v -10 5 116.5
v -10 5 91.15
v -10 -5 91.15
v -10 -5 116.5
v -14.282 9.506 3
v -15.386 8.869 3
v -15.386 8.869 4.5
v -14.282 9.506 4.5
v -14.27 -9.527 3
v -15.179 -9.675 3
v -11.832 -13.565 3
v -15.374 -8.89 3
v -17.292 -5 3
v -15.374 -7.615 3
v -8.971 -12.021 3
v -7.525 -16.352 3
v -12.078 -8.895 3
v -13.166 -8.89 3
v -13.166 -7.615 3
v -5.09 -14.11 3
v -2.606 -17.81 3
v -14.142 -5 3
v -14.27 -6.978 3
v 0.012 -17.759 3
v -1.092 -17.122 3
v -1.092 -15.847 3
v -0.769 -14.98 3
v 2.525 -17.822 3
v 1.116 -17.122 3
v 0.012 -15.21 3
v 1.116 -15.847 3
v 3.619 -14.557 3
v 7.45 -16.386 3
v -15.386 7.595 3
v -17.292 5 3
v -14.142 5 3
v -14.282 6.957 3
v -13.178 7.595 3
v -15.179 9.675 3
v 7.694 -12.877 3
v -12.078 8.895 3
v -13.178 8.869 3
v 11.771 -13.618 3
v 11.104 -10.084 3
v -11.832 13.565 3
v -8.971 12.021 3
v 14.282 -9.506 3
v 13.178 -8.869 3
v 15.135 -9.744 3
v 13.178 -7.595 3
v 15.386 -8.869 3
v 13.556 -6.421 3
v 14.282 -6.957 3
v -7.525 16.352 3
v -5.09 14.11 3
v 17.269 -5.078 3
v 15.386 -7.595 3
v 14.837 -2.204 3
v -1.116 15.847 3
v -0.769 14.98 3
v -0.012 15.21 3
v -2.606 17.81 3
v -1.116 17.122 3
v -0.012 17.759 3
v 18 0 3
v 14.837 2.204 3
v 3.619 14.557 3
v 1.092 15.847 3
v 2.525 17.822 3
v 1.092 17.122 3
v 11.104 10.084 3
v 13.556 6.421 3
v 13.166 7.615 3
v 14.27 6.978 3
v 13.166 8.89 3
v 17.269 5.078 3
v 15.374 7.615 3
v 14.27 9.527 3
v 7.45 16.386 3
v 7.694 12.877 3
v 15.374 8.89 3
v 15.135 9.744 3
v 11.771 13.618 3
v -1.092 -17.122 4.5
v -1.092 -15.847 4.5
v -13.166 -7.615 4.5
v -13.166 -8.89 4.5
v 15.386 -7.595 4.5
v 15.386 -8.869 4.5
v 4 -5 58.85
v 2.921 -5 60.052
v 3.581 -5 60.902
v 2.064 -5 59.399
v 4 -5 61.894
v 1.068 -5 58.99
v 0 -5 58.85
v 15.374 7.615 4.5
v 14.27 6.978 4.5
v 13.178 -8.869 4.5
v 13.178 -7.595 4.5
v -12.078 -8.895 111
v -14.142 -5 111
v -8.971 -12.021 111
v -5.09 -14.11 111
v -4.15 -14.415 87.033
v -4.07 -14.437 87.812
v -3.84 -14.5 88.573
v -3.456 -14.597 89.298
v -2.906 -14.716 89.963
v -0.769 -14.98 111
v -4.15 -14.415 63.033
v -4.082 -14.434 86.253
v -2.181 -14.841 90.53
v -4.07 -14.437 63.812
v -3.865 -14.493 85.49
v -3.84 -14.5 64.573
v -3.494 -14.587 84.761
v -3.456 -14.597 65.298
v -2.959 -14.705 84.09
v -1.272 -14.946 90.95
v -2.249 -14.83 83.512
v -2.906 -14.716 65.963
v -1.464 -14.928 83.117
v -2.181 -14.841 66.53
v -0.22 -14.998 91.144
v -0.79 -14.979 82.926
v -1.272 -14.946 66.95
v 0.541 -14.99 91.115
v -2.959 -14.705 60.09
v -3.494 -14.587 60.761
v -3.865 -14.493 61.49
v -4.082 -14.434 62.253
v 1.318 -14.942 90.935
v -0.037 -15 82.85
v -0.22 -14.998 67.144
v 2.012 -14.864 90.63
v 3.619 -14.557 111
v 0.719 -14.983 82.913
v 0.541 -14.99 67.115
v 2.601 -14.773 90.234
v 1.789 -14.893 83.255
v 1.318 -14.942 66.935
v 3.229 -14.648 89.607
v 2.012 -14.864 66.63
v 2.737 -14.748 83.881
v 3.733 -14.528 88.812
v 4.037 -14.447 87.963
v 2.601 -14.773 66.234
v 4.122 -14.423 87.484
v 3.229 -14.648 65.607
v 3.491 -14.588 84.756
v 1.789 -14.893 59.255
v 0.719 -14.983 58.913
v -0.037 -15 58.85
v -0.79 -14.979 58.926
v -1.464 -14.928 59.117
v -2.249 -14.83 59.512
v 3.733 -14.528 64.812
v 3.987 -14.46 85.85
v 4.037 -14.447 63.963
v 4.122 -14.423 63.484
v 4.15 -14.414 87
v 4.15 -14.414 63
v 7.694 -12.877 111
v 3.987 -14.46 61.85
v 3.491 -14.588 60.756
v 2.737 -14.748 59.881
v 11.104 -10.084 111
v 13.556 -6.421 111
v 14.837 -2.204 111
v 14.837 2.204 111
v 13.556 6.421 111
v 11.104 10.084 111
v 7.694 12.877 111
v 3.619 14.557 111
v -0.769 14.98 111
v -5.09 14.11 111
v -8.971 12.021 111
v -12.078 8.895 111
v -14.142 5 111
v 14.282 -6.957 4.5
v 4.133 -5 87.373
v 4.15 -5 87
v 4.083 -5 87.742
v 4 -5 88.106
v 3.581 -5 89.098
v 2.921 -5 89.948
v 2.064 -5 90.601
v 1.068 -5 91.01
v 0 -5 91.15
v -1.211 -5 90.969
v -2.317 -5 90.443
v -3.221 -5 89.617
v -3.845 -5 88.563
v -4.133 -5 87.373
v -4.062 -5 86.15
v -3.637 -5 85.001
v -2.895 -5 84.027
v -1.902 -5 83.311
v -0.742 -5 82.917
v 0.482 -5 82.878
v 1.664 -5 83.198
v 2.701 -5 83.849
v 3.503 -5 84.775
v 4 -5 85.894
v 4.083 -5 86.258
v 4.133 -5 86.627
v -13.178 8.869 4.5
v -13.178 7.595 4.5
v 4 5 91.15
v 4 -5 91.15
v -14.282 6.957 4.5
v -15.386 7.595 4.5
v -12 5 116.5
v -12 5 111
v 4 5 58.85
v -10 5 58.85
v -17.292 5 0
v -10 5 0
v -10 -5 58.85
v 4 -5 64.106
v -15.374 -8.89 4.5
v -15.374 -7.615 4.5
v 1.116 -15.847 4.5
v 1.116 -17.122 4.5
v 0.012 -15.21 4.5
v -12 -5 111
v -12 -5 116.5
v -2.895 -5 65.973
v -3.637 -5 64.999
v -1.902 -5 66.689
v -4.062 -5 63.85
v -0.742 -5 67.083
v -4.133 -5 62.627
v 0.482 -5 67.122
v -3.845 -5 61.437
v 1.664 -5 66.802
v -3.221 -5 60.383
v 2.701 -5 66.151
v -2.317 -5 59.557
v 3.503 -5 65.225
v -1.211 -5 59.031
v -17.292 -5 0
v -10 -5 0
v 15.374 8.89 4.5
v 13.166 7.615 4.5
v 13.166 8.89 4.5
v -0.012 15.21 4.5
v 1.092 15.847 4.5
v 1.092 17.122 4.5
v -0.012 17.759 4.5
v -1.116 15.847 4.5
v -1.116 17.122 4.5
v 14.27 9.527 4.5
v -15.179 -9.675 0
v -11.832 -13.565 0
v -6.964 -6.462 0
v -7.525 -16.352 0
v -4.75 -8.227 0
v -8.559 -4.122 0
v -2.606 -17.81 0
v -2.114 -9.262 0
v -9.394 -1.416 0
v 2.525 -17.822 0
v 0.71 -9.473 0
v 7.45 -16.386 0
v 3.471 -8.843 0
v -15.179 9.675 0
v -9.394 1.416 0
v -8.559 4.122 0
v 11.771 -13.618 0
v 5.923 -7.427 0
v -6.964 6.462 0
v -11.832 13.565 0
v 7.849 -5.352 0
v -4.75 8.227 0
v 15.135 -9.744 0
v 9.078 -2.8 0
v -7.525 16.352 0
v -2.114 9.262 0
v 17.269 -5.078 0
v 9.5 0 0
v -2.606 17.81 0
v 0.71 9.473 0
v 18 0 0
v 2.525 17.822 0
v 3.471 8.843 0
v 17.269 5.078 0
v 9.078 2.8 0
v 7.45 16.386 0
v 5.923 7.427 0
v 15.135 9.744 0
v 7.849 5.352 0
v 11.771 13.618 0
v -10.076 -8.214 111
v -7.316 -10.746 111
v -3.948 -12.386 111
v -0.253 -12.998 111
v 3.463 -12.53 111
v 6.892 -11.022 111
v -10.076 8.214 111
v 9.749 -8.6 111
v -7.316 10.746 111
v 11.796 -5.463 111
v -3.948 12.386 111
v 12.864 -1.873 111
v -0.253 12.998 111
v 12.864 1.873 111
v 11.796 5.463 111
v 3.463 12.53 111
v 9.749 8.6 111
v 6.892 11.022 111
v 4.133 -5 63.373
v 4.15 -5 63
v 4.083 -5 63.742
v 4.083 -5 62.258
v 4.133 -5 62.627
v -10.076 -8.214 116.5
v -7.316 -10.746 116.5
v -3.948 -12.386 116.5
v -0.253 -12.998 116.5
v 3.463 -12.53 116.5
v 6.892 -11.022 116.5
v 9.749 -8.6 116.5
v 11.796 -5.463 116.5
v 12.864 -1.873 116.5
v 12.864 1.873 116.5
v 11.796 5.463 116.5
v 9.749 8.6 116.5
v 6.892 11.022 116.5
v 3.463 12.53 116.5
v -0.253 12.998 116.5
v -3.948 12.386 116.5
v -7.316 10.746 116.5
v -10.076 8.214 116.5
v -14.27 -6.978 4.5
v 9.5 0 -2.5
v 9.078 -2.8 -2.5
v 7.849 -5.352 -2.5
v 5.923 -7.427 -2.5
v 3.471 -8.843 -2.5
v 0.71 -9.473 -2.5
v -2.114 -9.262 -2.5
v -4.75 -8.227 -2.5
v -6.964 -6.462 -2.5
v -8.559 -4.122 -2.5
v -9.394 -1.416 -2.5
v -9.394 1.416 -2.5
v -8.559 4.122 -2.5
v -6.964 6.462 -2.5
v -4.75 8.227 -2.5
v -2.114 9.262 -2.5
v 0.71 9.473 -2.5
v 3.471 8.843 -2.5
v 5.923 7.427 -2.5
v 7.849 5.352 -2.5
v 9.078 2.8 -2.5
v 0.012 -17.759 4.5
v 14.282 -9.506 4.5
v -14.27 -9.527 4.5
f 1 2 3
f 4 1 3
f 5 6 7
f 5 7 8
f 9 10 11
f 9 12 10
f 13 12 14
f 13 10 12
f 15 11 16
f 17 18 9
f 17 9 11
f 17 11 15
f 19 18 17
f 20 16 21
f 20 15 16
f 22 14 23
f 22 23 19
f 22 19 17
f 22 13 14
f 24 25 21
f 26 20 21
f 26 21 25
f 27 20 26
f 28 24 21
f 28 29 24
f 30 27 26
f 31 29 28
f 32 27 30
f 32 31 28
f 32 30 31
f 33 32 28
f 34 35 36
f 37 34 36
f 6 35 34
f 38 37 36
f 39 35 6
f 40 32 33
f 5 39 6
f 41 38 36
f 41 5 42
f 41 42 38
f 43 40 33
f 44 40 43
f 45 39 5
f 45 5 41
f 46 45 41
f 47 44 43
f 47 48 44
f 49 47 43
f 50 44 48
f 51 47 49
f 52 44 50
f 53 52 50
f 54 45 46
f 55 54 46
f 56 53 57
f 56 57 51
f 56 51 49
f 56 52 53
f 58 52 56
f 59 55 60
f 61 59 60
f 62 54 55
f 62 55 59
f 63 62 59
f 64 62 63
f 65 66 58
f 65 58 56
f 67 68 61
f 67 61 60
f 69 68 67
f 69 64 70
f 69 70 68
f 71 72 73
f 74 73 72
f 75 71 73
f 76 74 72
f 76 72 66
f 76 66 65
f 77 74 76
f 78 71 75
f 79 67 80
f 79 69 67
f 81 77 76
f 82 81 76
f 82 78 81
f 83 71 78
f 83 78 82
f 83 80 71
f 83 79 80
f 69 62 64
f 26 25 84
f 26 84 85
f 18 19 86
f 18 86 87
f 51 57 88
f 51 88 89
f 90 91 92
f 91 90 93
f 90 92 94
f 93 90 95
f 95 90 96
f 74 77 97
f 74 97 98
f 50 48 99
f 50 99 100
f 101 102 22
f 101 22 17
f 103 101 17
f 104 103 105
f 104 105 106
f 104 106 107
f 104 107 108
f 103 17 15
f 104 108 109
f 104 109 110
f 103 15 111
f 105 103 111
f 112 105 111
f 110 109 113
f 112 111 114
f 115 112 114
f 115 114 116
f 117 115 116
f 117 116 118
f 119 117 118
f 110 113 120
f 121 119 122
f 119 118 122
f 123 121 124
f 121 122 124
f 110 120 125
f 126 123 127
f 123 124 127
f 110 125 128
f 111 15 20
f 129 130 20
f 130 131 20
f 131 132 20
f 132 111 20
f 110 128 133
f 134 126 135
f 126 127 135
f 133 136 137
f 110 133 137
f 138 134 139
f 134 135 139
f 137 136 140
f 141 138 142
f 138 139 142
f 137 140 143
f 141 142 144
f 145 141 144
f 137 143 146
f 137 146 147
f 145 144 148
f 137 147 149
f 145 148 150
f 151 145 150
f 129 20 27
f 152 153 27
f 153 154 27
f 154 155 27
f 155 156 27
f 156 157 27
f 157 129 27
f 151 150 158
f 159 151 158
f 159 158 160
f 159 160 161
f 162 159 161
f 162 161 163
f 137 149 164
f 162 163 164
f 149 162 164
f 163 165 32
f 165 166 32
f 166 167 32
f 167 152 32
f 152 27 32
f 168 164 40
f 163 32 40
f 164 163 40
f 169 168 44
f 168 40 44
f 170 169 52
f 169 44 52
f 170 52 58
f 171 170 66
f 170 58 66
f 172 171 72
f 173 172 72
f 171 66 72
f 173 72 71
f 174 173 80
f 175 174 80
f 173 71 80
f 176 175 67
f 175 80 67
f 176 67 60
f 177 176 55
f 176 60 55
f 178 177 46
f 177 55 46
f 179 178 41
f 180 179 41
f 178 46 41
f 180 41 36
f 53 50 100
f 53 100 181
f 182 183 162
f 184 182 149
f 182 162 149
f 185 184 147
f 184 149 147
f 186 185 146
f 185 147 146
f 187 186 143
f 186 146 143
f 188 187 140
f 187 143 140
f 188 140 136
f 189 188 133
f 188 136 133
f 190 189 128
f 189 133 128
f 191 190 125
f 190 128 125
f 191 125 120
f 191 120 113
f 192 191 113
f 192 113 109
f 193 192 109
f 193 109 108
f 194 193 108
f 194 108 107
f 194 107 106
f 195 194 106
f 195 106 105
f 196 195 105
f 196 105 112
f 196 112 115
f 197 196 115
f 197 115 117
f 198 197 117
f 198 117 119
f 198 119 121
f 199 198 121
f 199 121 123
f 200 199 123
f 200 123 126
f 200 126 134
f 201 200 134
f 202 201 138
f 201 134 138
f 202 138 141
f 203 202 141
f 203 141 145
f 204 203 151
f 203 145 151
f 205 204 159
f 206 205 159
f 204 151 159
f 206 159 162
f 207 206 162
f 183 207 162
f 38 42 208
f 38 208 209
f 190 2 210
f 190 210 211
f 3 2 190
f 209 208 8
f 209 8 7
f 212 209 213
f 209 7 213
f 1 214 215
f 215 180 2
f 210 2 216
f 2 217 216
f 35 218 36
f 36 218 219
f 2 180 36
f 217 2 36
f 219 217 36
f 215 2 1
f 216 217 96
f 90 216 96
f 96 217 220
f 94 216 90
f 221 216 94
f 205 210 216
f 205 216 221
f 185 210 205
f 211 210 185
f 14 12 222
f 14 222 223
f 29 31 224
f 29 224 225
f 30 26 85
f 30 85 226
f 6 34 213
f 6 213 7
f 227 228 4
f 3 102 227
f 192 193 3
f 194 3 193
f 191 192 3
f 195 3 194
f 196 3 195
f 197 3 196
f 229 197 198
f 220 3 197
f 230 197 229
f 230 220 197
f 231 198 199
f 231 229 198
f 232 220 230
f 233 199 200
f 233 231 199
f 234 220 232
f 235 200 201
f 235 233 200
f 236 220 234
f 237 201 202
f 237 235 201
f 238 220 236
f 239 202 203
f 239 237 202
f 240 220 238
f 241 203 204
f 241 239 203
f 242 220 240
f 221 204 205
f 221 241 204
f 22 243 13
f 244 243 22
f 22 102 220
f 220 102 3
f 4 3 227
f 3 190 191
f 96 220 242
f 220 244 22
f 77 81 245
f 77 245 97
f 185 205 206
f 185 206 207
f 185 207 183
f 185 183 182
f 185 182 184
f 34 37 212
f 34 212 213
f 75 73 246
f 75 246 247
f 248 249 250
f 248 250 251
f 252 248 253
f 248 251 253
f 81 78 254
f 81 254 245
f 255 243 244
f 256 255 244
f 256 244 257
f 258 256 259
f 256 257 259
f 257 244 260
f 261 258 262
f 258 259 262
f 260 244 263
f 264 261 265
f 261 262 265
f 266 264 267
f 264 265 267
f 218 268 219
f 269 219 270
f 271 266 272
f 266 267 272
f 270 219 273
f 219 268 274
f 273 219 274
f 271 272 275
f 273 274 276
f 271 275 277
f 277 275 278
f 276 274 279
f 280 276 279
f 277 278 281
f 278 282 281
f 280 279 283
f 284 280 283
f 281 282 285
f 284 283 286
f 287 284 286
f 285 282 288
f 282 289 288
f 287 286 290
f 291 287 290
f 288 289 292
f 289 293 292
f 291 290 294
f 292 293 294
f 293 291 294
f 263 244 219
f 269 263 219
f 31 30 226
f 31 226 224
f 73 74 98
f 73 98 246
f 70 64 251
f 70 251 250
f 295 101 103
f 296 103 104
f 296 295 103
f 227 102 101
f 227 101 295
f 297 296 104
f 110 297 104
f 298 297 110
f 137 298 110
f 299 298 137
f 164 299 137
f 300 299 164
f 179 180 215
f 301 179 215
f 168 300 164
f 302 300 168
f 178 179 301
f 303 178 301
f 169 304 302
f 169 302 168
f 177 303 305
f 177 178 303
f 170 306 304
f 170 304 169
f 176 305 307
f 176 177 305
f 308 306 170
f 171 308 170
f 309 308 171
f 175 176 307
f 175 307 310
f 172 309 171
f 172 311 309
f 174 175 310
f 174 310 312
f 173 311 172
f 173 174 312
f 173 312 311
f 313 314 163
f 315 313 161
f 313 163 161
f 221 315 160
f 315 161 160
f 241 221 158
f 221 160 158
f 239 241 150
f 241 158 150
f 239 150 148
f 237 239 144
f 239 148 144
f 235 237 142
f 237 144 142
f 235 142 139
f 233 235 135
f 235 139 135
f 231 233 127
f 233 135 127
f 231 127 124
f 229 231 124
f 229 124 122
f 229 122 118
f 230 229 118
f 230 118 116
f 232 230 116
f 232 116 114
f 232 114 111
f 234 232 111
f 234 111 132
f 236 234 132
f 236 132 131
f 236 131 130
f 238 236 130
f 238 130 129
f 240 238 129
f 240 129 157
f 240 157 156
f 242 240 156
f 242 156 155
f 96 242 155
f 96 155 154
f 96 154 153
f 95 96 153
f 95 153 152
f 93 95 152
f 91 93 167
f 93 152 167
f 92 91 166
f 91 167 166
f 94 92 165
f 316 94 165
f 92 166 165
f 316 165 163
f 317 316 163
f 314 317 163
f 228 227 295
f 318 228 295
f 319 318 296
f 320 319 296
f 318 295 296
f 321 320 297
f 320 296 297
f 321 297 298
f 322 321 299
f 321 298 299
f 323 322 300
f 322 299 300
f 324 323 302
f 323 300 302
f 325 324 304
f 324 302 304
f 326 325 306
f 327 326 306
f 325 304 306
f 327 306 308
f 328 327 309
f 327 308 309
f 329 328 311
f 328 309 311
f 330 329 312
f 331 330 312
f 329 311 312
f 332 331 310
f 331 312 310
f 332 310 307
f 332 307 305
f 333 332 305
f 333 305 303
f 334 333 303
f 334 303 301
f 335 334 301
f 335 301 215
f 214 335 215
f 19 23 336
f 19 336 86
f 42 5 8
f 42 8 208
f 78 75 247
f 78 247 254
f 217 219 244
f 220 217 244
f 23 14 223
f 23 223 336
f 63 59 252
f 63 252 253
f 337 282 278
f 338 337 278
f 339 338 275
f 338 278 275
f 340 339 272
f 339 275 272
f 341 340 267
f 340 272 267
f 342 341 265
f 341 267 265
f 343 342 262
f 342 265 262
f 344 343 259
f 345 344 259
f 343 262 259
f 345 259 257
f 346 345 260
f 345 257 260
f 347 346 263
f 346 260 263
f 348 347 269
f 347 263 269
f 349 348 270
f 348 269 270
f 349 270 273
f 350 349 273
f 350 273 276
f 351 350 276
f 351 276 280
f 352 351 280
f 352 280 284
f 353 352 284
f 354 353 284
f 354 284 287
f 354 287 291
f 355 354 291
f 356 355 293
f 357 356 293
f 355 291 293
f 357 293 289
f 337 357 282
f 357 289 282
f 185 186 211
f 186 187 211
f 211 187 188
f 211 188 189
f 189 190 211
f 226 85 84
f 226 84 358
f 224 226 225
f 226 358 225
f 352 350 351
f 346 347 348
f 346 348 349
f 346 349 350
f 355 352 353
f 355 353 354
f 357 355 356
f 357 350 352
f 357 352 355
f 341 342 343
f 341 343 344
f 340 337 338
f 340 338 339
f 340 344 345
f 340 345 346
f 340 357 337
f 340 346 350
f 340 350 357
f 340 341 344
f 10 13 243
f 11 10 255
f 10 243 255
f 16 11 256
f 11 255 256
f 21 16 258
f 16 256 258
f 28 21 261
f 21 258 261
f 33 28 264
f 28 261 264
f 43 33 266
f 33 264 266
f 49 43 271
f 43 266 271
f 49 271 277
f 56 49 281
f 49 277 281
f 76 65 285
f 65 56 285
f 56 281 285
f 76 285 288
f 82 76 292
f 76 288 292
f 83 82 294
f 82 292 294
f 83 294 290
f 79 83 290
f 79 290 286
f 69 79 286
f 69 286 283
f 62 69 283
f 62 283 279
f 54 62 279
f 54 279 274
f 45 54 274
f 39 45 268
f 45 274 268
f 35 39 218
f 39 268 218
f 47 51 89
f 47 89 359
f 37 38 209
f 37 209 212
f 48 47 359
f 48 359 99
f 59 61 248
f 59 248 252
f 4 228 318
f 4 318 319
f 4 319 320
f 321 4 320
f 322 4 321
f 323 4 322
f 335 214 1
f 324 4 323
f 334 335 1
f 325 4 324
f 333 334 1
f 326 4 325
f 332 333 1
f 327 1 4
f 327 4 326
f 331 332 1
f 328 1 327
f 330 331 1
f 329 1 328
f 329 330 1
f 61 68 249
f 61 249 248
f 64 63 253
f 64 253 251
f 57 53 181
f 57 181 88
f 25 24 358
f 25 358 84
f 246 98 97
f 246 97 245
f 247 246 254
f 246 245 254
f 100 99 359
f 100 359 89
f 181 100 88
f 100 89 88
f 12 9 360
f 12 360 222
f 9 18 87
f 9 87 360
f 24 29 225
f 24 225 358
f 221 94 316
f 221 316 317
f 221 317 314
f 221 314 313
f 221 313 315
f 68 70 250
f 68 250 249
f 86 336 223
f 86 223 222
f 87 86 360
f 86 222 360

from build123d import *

# Parameters (mm, degrees)
SKETCH_R           = 18
PAD_DEPTH          = 3
SKETCH001_R        = 15
PAD001_DEPTH       = 108
SKETCH002_R        = 9.5
PAD002_DEPTH       = 2.5
SKETCH003_R        = 13
PAD003_DEPTH       = 5.5
PAD004_DEPTH       = 1.5
POLARPATTERN_COUNT = 6
SKETCH009_W        = 8
SKETCH009_H        = 10
POCKET_DEPTH       = 118
SKETCH010_R        = 4.15
POCKET001_DEPTH    = 10
SKETCH011_R        = 4.15
POCKET002_DEPTH    = 10
SKETCH012_W        = 10
SKETCH012_H        = 32.3
POCKET003_DEPTH    = 14


with BuildPart() as part:
    # Sketch → Pad (new body)
    with BuildSketch(Plane.XY):
        Circle(SKETCH_R)
    extrude(amount=PAD_DEPTH)

    # Sketch001 (on Face3 of Pad) → Pad001 (join)
    with BuildSketch(Plane.XY.offset(3)):
        Circle(SKETCH001_R)
    extrude(amount=PAD001_DEPTH)

    # Sketch002 (on Face2 of Pad001) → Pad002 (join)
    with BuildSketch(Plane(origin=(0, 0, 0), x_dir=(1, 0, 0), z_dir=(0, 0, -1))):
        Circle(SKETCH002_R)
    extrude(amount=PAD002_DEPTH)

    # Sketch003 (on Face7 of Pad002) → Pad003 (join)
    with BuildSketch(Plane.XY.offset(111)):
        Circle(SKETCH003_R)
    extrude(amount=PAD003_DEPTH)

    # Sketch008 (on Face3 of Pad003) → Pad004 (join)
    with BuildSketch(Plane.XY.offset(3)):
        Polygon((-1.11579, 17.121659), (-0.012041, 17.758909), (1.091708, 17.121659), (1.091708, 15.84716), (-0.012041, 15.209911), (-1.11579, 15.84716), align=None)
    pad004 = extrude(amount=PAD004_DEPTH)

    # PolarPattern: Pad004 ×6 about axis
    polarpattern_axis = Axis((0, 0, 3), (0, 0, 1))
    for i in range(1, POLARPATTERN_COUNT):
        add(pad004.rotate(polarpattern_axis, i * 360 / POLARPATTERN_COUNT))

    # Sketch009 (on Face2 of PolarPattern) → Pocket (cut)
    with BuildSketch(Plane(origin=(0, 0, 0), x_dir=(1, 0, 0), z_dir=(0, 0, -1))):
        with Locations((-14, 0)):
            Rectangle(SKETCH009_W, SKETCH009_H)
    extrude(amount=-POCKET_DEPTH, mode=Mode.SUBTRACT)

    # Sketch010 (on DatumPlane) → Pocket001 (cut)
    with BuildSketch(Plane.XZ.offset(15)):
        with Locations((0, 87)):
            Circle(SKETCH010_R)
    extrude(amount=-POCKET001_DEPTH, mode=Mode.SUBTRACT)

    # Sketch011 (on DatumPlane) → Pocket002 (cut)
    with BuildSketch(Plane.XZ.offset(15)):
        with Locations((0, 63)):
            Circle(SKETCH011_R)
    extrude(amount=-POCKET002_DEPTH, mode=Mode.SUBTRACT)

    # Sketch012 (on Face7 of Pocket002) → Pocket003 (cut)
    with BuildSketch(Plane(origin=(-10, 0, 0), x_dir=(0, -1, 0), z_dir=(-1, 0, 0))):
        with Locations((0, 75)):
            Rectangle(SKETCH012_W, SKETCH012_H)
    extrude(amount=-POCKET003_DEPTH, mode=Mode.SUBTRACT)


solid = part.part
